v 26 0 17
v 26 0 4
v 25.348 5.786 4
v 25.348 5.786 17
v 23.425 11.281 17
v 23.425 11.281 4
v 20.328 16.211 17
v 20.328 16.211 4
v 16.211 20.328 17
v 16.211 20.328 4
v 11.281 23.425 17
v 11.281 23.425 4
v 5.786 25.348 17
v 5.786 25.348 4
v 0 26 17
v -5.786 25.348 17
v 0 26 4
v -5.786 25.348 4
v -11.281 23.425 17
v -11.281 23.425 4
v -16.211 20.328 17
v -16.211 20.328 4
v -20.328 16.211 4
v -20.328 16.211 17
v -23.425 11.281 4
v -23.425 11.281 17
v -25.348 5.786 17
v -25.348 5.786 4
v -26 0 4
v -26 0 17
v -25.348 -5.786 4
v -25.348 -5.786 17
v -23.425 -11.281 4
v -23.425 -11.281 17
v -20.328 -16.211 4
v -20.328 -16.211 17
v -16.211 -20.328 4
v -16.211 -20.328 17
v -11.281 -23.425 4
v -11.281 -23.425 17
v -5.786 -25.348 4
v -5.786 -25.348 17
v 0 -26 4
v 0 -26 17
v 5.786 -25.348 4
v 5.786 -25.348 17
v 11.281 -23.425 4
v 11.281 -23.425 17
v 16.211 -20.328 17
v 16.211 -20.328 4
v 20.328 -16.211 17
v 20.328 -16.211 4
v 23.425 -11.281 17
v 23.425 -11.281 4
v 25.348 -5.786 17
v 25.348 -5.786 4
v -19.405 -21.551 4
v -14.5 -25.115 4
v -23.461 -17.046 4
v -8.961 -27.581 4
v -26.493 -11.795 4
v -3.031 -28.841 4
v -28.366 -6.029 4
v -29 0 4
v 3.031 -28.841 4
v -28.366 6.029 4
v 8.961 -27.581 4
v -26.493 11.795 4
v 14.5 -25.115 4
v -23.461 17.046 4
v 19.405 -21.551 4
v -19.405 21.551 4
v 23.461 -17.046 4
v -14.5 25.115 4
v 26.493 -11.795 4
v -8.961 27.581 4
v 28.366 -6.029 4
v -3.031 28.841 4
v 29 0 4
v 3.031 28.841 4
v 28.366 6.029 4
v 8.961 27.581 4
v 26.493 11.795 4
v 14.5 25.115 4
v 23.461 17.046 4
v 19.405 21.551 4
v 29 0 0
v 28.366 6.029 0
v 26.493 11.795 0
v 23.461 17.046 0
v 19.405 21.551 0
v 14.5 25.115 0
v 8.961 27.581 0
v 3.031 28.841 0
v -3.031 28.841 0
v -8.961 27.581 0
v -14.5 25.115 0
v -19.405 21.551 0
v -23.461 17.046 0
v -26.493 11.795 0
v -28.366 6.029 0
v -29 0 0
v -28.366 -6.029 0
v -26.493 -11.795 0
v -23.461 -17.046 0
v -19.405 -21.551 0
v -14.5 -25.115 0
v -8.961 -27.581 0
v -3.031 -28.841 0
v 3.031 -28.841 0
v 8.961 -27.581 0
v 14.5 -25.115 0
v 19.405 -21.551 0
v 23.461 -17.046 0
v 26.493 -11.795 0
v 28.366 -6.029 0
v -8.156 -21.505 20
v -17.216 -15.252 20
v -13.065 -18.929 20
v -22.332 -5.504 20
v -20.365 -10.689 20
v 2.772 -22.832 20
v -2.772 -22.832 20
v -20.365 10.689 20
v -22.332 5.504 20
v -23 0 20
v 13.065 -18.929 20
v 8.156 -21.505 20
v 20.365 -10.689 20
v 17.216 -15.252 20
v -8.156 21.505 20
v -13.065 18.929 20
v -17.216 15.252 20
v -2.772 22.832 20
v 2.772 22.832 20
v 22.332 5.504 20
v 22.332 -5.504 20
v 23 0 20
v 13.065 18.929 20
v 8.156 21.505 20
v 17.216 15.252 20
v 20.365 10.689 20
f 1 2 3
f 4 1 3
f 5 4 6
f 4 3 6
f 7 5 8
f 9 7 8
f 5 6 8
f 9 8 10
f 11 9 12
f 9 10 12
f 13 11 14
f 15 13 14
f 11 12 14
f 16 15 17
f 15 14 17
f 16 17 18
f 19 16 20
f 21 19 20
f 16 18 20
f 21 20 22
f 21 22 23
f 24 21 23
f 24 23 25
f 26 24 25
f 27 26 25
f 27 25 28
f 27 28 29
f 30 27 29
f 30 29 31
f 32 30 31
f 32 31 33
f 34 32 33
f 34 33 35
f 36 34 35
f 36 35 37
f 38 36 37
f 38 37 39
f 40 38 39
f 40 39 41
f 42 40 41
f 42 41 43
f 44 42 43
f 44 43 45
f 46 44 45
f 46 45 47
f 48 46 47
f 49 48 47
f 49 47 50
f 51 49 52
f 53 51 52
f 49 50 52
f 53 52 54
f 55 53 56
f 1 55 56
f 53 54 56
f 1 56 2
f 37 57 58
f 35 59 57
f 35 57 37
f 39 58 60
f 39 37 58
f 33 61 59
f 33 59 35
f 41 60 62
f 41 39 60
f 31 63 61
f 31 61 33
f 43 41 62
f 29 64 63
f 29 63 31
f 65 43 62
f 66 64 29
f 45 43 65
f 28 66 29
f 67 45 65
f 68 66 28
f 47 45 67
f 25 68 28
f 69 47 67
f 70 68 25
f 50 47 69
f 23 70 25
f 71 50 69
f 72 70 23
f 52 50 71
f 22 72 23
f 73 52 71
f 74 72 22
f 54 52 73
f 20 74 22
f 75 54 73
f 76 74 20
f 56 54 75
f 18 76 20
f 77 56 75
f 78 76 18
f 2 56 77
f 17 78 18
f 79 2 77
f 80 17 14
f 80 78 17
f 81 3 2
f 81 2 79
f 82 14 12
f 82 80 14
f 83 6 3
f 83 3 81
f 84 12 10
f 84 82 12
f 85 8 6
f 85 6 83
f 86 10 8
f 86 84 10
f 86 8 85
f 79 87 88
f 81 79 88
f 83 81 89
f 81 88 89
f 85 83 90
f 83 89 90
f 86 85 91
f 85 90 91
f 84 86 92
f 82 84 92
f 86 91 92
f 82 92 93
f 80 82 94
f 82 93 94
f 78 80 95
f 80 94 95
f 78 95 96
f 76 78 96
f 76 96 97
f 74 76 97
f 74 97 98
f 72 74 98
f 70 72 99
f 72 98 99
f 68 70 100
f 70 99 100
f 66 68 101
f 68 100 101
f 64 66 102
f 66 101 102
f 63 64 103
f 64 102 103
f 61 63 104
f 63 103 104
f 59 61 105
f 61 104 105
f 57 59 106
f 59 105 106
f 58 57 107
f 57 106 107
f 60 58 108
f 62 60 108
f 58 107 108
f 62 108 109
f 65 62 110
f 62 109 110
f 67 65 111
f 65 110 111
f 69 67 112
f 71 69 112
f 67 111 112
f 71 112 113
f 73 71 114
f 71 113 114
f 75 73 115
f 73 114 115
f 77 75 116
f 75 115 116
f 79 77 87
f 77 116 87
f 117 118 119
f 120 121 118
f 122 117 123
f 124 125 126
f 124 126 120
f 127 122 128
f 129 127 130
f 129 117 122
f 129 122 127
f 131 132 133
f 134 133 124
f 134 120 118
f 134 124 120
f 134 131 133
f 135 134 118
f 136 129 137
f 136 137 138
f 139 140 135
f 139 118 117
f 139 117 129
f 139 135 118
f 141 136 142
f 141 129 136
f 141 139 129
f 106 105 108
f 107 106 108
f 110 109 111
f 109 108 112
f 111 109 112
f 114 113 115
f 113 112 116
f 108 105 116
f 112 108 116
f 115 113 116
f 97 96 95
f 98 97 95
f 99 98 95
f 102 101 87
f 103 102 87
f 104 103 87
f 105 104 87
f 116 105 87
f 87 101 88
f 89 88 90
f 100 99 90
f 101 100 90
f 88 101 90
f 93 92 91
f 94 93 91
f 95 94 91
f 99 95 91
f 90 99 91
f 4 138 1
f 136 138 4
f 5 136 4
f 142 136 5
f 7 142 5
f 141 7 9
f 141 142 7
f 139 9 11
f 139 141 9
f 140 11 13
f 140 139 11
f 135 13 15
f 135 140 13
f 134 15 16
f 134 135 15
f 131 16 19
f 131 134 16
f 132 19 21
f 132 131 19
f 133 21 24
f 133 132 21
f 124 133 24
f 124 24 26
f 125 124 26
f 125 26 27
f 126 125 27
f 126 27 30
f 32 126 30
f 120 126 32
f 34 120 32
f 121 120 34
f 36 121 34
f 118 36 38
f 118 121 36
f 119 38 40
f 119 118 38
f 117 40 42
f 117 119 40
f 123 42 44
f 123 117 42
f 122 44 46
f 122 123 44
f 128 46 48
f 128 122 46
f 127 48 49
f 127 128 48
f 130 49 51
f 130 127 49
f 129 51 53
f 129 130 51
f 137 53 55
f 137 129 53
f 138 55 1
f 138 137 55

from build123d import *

# Parameters (mm, degrees)
F0_R     = 26
F0_W     = 14.36842
F0_H     = 5.710526
F1_DEPTH = 20
F0_R_2   = 29
F2_DEPTH = 4
F3_SIZE  = 3


with BuildPart() as f1:
    # F0 (on Top) → F1 (new body)
    with BuildSketch(Plane.XY):
        Circle(F0_R)
        Rectangle(F0_W, F0_H, mode=Mode.SUBTRACT)
        Rectangle(F0_W, F0_H)
    extrude(amount=F1_DEPTH)

    # F0 (on Top) → F2 (join)
    with BuildSketch(Plane.XY):
        Circle(F0_R_2)
        Circle(F0_R, mode=Mode.SUBTRACT)
    extrude(amount=F2_DEPTH)

    # F3
    f3_edges = [f1.edges().sort_by_distance(p)[0] for p in [
        (-26, 0, 20),
    ]]
    chamfer(f3_edges, length=F3_SIZE)


solid = f1.part
